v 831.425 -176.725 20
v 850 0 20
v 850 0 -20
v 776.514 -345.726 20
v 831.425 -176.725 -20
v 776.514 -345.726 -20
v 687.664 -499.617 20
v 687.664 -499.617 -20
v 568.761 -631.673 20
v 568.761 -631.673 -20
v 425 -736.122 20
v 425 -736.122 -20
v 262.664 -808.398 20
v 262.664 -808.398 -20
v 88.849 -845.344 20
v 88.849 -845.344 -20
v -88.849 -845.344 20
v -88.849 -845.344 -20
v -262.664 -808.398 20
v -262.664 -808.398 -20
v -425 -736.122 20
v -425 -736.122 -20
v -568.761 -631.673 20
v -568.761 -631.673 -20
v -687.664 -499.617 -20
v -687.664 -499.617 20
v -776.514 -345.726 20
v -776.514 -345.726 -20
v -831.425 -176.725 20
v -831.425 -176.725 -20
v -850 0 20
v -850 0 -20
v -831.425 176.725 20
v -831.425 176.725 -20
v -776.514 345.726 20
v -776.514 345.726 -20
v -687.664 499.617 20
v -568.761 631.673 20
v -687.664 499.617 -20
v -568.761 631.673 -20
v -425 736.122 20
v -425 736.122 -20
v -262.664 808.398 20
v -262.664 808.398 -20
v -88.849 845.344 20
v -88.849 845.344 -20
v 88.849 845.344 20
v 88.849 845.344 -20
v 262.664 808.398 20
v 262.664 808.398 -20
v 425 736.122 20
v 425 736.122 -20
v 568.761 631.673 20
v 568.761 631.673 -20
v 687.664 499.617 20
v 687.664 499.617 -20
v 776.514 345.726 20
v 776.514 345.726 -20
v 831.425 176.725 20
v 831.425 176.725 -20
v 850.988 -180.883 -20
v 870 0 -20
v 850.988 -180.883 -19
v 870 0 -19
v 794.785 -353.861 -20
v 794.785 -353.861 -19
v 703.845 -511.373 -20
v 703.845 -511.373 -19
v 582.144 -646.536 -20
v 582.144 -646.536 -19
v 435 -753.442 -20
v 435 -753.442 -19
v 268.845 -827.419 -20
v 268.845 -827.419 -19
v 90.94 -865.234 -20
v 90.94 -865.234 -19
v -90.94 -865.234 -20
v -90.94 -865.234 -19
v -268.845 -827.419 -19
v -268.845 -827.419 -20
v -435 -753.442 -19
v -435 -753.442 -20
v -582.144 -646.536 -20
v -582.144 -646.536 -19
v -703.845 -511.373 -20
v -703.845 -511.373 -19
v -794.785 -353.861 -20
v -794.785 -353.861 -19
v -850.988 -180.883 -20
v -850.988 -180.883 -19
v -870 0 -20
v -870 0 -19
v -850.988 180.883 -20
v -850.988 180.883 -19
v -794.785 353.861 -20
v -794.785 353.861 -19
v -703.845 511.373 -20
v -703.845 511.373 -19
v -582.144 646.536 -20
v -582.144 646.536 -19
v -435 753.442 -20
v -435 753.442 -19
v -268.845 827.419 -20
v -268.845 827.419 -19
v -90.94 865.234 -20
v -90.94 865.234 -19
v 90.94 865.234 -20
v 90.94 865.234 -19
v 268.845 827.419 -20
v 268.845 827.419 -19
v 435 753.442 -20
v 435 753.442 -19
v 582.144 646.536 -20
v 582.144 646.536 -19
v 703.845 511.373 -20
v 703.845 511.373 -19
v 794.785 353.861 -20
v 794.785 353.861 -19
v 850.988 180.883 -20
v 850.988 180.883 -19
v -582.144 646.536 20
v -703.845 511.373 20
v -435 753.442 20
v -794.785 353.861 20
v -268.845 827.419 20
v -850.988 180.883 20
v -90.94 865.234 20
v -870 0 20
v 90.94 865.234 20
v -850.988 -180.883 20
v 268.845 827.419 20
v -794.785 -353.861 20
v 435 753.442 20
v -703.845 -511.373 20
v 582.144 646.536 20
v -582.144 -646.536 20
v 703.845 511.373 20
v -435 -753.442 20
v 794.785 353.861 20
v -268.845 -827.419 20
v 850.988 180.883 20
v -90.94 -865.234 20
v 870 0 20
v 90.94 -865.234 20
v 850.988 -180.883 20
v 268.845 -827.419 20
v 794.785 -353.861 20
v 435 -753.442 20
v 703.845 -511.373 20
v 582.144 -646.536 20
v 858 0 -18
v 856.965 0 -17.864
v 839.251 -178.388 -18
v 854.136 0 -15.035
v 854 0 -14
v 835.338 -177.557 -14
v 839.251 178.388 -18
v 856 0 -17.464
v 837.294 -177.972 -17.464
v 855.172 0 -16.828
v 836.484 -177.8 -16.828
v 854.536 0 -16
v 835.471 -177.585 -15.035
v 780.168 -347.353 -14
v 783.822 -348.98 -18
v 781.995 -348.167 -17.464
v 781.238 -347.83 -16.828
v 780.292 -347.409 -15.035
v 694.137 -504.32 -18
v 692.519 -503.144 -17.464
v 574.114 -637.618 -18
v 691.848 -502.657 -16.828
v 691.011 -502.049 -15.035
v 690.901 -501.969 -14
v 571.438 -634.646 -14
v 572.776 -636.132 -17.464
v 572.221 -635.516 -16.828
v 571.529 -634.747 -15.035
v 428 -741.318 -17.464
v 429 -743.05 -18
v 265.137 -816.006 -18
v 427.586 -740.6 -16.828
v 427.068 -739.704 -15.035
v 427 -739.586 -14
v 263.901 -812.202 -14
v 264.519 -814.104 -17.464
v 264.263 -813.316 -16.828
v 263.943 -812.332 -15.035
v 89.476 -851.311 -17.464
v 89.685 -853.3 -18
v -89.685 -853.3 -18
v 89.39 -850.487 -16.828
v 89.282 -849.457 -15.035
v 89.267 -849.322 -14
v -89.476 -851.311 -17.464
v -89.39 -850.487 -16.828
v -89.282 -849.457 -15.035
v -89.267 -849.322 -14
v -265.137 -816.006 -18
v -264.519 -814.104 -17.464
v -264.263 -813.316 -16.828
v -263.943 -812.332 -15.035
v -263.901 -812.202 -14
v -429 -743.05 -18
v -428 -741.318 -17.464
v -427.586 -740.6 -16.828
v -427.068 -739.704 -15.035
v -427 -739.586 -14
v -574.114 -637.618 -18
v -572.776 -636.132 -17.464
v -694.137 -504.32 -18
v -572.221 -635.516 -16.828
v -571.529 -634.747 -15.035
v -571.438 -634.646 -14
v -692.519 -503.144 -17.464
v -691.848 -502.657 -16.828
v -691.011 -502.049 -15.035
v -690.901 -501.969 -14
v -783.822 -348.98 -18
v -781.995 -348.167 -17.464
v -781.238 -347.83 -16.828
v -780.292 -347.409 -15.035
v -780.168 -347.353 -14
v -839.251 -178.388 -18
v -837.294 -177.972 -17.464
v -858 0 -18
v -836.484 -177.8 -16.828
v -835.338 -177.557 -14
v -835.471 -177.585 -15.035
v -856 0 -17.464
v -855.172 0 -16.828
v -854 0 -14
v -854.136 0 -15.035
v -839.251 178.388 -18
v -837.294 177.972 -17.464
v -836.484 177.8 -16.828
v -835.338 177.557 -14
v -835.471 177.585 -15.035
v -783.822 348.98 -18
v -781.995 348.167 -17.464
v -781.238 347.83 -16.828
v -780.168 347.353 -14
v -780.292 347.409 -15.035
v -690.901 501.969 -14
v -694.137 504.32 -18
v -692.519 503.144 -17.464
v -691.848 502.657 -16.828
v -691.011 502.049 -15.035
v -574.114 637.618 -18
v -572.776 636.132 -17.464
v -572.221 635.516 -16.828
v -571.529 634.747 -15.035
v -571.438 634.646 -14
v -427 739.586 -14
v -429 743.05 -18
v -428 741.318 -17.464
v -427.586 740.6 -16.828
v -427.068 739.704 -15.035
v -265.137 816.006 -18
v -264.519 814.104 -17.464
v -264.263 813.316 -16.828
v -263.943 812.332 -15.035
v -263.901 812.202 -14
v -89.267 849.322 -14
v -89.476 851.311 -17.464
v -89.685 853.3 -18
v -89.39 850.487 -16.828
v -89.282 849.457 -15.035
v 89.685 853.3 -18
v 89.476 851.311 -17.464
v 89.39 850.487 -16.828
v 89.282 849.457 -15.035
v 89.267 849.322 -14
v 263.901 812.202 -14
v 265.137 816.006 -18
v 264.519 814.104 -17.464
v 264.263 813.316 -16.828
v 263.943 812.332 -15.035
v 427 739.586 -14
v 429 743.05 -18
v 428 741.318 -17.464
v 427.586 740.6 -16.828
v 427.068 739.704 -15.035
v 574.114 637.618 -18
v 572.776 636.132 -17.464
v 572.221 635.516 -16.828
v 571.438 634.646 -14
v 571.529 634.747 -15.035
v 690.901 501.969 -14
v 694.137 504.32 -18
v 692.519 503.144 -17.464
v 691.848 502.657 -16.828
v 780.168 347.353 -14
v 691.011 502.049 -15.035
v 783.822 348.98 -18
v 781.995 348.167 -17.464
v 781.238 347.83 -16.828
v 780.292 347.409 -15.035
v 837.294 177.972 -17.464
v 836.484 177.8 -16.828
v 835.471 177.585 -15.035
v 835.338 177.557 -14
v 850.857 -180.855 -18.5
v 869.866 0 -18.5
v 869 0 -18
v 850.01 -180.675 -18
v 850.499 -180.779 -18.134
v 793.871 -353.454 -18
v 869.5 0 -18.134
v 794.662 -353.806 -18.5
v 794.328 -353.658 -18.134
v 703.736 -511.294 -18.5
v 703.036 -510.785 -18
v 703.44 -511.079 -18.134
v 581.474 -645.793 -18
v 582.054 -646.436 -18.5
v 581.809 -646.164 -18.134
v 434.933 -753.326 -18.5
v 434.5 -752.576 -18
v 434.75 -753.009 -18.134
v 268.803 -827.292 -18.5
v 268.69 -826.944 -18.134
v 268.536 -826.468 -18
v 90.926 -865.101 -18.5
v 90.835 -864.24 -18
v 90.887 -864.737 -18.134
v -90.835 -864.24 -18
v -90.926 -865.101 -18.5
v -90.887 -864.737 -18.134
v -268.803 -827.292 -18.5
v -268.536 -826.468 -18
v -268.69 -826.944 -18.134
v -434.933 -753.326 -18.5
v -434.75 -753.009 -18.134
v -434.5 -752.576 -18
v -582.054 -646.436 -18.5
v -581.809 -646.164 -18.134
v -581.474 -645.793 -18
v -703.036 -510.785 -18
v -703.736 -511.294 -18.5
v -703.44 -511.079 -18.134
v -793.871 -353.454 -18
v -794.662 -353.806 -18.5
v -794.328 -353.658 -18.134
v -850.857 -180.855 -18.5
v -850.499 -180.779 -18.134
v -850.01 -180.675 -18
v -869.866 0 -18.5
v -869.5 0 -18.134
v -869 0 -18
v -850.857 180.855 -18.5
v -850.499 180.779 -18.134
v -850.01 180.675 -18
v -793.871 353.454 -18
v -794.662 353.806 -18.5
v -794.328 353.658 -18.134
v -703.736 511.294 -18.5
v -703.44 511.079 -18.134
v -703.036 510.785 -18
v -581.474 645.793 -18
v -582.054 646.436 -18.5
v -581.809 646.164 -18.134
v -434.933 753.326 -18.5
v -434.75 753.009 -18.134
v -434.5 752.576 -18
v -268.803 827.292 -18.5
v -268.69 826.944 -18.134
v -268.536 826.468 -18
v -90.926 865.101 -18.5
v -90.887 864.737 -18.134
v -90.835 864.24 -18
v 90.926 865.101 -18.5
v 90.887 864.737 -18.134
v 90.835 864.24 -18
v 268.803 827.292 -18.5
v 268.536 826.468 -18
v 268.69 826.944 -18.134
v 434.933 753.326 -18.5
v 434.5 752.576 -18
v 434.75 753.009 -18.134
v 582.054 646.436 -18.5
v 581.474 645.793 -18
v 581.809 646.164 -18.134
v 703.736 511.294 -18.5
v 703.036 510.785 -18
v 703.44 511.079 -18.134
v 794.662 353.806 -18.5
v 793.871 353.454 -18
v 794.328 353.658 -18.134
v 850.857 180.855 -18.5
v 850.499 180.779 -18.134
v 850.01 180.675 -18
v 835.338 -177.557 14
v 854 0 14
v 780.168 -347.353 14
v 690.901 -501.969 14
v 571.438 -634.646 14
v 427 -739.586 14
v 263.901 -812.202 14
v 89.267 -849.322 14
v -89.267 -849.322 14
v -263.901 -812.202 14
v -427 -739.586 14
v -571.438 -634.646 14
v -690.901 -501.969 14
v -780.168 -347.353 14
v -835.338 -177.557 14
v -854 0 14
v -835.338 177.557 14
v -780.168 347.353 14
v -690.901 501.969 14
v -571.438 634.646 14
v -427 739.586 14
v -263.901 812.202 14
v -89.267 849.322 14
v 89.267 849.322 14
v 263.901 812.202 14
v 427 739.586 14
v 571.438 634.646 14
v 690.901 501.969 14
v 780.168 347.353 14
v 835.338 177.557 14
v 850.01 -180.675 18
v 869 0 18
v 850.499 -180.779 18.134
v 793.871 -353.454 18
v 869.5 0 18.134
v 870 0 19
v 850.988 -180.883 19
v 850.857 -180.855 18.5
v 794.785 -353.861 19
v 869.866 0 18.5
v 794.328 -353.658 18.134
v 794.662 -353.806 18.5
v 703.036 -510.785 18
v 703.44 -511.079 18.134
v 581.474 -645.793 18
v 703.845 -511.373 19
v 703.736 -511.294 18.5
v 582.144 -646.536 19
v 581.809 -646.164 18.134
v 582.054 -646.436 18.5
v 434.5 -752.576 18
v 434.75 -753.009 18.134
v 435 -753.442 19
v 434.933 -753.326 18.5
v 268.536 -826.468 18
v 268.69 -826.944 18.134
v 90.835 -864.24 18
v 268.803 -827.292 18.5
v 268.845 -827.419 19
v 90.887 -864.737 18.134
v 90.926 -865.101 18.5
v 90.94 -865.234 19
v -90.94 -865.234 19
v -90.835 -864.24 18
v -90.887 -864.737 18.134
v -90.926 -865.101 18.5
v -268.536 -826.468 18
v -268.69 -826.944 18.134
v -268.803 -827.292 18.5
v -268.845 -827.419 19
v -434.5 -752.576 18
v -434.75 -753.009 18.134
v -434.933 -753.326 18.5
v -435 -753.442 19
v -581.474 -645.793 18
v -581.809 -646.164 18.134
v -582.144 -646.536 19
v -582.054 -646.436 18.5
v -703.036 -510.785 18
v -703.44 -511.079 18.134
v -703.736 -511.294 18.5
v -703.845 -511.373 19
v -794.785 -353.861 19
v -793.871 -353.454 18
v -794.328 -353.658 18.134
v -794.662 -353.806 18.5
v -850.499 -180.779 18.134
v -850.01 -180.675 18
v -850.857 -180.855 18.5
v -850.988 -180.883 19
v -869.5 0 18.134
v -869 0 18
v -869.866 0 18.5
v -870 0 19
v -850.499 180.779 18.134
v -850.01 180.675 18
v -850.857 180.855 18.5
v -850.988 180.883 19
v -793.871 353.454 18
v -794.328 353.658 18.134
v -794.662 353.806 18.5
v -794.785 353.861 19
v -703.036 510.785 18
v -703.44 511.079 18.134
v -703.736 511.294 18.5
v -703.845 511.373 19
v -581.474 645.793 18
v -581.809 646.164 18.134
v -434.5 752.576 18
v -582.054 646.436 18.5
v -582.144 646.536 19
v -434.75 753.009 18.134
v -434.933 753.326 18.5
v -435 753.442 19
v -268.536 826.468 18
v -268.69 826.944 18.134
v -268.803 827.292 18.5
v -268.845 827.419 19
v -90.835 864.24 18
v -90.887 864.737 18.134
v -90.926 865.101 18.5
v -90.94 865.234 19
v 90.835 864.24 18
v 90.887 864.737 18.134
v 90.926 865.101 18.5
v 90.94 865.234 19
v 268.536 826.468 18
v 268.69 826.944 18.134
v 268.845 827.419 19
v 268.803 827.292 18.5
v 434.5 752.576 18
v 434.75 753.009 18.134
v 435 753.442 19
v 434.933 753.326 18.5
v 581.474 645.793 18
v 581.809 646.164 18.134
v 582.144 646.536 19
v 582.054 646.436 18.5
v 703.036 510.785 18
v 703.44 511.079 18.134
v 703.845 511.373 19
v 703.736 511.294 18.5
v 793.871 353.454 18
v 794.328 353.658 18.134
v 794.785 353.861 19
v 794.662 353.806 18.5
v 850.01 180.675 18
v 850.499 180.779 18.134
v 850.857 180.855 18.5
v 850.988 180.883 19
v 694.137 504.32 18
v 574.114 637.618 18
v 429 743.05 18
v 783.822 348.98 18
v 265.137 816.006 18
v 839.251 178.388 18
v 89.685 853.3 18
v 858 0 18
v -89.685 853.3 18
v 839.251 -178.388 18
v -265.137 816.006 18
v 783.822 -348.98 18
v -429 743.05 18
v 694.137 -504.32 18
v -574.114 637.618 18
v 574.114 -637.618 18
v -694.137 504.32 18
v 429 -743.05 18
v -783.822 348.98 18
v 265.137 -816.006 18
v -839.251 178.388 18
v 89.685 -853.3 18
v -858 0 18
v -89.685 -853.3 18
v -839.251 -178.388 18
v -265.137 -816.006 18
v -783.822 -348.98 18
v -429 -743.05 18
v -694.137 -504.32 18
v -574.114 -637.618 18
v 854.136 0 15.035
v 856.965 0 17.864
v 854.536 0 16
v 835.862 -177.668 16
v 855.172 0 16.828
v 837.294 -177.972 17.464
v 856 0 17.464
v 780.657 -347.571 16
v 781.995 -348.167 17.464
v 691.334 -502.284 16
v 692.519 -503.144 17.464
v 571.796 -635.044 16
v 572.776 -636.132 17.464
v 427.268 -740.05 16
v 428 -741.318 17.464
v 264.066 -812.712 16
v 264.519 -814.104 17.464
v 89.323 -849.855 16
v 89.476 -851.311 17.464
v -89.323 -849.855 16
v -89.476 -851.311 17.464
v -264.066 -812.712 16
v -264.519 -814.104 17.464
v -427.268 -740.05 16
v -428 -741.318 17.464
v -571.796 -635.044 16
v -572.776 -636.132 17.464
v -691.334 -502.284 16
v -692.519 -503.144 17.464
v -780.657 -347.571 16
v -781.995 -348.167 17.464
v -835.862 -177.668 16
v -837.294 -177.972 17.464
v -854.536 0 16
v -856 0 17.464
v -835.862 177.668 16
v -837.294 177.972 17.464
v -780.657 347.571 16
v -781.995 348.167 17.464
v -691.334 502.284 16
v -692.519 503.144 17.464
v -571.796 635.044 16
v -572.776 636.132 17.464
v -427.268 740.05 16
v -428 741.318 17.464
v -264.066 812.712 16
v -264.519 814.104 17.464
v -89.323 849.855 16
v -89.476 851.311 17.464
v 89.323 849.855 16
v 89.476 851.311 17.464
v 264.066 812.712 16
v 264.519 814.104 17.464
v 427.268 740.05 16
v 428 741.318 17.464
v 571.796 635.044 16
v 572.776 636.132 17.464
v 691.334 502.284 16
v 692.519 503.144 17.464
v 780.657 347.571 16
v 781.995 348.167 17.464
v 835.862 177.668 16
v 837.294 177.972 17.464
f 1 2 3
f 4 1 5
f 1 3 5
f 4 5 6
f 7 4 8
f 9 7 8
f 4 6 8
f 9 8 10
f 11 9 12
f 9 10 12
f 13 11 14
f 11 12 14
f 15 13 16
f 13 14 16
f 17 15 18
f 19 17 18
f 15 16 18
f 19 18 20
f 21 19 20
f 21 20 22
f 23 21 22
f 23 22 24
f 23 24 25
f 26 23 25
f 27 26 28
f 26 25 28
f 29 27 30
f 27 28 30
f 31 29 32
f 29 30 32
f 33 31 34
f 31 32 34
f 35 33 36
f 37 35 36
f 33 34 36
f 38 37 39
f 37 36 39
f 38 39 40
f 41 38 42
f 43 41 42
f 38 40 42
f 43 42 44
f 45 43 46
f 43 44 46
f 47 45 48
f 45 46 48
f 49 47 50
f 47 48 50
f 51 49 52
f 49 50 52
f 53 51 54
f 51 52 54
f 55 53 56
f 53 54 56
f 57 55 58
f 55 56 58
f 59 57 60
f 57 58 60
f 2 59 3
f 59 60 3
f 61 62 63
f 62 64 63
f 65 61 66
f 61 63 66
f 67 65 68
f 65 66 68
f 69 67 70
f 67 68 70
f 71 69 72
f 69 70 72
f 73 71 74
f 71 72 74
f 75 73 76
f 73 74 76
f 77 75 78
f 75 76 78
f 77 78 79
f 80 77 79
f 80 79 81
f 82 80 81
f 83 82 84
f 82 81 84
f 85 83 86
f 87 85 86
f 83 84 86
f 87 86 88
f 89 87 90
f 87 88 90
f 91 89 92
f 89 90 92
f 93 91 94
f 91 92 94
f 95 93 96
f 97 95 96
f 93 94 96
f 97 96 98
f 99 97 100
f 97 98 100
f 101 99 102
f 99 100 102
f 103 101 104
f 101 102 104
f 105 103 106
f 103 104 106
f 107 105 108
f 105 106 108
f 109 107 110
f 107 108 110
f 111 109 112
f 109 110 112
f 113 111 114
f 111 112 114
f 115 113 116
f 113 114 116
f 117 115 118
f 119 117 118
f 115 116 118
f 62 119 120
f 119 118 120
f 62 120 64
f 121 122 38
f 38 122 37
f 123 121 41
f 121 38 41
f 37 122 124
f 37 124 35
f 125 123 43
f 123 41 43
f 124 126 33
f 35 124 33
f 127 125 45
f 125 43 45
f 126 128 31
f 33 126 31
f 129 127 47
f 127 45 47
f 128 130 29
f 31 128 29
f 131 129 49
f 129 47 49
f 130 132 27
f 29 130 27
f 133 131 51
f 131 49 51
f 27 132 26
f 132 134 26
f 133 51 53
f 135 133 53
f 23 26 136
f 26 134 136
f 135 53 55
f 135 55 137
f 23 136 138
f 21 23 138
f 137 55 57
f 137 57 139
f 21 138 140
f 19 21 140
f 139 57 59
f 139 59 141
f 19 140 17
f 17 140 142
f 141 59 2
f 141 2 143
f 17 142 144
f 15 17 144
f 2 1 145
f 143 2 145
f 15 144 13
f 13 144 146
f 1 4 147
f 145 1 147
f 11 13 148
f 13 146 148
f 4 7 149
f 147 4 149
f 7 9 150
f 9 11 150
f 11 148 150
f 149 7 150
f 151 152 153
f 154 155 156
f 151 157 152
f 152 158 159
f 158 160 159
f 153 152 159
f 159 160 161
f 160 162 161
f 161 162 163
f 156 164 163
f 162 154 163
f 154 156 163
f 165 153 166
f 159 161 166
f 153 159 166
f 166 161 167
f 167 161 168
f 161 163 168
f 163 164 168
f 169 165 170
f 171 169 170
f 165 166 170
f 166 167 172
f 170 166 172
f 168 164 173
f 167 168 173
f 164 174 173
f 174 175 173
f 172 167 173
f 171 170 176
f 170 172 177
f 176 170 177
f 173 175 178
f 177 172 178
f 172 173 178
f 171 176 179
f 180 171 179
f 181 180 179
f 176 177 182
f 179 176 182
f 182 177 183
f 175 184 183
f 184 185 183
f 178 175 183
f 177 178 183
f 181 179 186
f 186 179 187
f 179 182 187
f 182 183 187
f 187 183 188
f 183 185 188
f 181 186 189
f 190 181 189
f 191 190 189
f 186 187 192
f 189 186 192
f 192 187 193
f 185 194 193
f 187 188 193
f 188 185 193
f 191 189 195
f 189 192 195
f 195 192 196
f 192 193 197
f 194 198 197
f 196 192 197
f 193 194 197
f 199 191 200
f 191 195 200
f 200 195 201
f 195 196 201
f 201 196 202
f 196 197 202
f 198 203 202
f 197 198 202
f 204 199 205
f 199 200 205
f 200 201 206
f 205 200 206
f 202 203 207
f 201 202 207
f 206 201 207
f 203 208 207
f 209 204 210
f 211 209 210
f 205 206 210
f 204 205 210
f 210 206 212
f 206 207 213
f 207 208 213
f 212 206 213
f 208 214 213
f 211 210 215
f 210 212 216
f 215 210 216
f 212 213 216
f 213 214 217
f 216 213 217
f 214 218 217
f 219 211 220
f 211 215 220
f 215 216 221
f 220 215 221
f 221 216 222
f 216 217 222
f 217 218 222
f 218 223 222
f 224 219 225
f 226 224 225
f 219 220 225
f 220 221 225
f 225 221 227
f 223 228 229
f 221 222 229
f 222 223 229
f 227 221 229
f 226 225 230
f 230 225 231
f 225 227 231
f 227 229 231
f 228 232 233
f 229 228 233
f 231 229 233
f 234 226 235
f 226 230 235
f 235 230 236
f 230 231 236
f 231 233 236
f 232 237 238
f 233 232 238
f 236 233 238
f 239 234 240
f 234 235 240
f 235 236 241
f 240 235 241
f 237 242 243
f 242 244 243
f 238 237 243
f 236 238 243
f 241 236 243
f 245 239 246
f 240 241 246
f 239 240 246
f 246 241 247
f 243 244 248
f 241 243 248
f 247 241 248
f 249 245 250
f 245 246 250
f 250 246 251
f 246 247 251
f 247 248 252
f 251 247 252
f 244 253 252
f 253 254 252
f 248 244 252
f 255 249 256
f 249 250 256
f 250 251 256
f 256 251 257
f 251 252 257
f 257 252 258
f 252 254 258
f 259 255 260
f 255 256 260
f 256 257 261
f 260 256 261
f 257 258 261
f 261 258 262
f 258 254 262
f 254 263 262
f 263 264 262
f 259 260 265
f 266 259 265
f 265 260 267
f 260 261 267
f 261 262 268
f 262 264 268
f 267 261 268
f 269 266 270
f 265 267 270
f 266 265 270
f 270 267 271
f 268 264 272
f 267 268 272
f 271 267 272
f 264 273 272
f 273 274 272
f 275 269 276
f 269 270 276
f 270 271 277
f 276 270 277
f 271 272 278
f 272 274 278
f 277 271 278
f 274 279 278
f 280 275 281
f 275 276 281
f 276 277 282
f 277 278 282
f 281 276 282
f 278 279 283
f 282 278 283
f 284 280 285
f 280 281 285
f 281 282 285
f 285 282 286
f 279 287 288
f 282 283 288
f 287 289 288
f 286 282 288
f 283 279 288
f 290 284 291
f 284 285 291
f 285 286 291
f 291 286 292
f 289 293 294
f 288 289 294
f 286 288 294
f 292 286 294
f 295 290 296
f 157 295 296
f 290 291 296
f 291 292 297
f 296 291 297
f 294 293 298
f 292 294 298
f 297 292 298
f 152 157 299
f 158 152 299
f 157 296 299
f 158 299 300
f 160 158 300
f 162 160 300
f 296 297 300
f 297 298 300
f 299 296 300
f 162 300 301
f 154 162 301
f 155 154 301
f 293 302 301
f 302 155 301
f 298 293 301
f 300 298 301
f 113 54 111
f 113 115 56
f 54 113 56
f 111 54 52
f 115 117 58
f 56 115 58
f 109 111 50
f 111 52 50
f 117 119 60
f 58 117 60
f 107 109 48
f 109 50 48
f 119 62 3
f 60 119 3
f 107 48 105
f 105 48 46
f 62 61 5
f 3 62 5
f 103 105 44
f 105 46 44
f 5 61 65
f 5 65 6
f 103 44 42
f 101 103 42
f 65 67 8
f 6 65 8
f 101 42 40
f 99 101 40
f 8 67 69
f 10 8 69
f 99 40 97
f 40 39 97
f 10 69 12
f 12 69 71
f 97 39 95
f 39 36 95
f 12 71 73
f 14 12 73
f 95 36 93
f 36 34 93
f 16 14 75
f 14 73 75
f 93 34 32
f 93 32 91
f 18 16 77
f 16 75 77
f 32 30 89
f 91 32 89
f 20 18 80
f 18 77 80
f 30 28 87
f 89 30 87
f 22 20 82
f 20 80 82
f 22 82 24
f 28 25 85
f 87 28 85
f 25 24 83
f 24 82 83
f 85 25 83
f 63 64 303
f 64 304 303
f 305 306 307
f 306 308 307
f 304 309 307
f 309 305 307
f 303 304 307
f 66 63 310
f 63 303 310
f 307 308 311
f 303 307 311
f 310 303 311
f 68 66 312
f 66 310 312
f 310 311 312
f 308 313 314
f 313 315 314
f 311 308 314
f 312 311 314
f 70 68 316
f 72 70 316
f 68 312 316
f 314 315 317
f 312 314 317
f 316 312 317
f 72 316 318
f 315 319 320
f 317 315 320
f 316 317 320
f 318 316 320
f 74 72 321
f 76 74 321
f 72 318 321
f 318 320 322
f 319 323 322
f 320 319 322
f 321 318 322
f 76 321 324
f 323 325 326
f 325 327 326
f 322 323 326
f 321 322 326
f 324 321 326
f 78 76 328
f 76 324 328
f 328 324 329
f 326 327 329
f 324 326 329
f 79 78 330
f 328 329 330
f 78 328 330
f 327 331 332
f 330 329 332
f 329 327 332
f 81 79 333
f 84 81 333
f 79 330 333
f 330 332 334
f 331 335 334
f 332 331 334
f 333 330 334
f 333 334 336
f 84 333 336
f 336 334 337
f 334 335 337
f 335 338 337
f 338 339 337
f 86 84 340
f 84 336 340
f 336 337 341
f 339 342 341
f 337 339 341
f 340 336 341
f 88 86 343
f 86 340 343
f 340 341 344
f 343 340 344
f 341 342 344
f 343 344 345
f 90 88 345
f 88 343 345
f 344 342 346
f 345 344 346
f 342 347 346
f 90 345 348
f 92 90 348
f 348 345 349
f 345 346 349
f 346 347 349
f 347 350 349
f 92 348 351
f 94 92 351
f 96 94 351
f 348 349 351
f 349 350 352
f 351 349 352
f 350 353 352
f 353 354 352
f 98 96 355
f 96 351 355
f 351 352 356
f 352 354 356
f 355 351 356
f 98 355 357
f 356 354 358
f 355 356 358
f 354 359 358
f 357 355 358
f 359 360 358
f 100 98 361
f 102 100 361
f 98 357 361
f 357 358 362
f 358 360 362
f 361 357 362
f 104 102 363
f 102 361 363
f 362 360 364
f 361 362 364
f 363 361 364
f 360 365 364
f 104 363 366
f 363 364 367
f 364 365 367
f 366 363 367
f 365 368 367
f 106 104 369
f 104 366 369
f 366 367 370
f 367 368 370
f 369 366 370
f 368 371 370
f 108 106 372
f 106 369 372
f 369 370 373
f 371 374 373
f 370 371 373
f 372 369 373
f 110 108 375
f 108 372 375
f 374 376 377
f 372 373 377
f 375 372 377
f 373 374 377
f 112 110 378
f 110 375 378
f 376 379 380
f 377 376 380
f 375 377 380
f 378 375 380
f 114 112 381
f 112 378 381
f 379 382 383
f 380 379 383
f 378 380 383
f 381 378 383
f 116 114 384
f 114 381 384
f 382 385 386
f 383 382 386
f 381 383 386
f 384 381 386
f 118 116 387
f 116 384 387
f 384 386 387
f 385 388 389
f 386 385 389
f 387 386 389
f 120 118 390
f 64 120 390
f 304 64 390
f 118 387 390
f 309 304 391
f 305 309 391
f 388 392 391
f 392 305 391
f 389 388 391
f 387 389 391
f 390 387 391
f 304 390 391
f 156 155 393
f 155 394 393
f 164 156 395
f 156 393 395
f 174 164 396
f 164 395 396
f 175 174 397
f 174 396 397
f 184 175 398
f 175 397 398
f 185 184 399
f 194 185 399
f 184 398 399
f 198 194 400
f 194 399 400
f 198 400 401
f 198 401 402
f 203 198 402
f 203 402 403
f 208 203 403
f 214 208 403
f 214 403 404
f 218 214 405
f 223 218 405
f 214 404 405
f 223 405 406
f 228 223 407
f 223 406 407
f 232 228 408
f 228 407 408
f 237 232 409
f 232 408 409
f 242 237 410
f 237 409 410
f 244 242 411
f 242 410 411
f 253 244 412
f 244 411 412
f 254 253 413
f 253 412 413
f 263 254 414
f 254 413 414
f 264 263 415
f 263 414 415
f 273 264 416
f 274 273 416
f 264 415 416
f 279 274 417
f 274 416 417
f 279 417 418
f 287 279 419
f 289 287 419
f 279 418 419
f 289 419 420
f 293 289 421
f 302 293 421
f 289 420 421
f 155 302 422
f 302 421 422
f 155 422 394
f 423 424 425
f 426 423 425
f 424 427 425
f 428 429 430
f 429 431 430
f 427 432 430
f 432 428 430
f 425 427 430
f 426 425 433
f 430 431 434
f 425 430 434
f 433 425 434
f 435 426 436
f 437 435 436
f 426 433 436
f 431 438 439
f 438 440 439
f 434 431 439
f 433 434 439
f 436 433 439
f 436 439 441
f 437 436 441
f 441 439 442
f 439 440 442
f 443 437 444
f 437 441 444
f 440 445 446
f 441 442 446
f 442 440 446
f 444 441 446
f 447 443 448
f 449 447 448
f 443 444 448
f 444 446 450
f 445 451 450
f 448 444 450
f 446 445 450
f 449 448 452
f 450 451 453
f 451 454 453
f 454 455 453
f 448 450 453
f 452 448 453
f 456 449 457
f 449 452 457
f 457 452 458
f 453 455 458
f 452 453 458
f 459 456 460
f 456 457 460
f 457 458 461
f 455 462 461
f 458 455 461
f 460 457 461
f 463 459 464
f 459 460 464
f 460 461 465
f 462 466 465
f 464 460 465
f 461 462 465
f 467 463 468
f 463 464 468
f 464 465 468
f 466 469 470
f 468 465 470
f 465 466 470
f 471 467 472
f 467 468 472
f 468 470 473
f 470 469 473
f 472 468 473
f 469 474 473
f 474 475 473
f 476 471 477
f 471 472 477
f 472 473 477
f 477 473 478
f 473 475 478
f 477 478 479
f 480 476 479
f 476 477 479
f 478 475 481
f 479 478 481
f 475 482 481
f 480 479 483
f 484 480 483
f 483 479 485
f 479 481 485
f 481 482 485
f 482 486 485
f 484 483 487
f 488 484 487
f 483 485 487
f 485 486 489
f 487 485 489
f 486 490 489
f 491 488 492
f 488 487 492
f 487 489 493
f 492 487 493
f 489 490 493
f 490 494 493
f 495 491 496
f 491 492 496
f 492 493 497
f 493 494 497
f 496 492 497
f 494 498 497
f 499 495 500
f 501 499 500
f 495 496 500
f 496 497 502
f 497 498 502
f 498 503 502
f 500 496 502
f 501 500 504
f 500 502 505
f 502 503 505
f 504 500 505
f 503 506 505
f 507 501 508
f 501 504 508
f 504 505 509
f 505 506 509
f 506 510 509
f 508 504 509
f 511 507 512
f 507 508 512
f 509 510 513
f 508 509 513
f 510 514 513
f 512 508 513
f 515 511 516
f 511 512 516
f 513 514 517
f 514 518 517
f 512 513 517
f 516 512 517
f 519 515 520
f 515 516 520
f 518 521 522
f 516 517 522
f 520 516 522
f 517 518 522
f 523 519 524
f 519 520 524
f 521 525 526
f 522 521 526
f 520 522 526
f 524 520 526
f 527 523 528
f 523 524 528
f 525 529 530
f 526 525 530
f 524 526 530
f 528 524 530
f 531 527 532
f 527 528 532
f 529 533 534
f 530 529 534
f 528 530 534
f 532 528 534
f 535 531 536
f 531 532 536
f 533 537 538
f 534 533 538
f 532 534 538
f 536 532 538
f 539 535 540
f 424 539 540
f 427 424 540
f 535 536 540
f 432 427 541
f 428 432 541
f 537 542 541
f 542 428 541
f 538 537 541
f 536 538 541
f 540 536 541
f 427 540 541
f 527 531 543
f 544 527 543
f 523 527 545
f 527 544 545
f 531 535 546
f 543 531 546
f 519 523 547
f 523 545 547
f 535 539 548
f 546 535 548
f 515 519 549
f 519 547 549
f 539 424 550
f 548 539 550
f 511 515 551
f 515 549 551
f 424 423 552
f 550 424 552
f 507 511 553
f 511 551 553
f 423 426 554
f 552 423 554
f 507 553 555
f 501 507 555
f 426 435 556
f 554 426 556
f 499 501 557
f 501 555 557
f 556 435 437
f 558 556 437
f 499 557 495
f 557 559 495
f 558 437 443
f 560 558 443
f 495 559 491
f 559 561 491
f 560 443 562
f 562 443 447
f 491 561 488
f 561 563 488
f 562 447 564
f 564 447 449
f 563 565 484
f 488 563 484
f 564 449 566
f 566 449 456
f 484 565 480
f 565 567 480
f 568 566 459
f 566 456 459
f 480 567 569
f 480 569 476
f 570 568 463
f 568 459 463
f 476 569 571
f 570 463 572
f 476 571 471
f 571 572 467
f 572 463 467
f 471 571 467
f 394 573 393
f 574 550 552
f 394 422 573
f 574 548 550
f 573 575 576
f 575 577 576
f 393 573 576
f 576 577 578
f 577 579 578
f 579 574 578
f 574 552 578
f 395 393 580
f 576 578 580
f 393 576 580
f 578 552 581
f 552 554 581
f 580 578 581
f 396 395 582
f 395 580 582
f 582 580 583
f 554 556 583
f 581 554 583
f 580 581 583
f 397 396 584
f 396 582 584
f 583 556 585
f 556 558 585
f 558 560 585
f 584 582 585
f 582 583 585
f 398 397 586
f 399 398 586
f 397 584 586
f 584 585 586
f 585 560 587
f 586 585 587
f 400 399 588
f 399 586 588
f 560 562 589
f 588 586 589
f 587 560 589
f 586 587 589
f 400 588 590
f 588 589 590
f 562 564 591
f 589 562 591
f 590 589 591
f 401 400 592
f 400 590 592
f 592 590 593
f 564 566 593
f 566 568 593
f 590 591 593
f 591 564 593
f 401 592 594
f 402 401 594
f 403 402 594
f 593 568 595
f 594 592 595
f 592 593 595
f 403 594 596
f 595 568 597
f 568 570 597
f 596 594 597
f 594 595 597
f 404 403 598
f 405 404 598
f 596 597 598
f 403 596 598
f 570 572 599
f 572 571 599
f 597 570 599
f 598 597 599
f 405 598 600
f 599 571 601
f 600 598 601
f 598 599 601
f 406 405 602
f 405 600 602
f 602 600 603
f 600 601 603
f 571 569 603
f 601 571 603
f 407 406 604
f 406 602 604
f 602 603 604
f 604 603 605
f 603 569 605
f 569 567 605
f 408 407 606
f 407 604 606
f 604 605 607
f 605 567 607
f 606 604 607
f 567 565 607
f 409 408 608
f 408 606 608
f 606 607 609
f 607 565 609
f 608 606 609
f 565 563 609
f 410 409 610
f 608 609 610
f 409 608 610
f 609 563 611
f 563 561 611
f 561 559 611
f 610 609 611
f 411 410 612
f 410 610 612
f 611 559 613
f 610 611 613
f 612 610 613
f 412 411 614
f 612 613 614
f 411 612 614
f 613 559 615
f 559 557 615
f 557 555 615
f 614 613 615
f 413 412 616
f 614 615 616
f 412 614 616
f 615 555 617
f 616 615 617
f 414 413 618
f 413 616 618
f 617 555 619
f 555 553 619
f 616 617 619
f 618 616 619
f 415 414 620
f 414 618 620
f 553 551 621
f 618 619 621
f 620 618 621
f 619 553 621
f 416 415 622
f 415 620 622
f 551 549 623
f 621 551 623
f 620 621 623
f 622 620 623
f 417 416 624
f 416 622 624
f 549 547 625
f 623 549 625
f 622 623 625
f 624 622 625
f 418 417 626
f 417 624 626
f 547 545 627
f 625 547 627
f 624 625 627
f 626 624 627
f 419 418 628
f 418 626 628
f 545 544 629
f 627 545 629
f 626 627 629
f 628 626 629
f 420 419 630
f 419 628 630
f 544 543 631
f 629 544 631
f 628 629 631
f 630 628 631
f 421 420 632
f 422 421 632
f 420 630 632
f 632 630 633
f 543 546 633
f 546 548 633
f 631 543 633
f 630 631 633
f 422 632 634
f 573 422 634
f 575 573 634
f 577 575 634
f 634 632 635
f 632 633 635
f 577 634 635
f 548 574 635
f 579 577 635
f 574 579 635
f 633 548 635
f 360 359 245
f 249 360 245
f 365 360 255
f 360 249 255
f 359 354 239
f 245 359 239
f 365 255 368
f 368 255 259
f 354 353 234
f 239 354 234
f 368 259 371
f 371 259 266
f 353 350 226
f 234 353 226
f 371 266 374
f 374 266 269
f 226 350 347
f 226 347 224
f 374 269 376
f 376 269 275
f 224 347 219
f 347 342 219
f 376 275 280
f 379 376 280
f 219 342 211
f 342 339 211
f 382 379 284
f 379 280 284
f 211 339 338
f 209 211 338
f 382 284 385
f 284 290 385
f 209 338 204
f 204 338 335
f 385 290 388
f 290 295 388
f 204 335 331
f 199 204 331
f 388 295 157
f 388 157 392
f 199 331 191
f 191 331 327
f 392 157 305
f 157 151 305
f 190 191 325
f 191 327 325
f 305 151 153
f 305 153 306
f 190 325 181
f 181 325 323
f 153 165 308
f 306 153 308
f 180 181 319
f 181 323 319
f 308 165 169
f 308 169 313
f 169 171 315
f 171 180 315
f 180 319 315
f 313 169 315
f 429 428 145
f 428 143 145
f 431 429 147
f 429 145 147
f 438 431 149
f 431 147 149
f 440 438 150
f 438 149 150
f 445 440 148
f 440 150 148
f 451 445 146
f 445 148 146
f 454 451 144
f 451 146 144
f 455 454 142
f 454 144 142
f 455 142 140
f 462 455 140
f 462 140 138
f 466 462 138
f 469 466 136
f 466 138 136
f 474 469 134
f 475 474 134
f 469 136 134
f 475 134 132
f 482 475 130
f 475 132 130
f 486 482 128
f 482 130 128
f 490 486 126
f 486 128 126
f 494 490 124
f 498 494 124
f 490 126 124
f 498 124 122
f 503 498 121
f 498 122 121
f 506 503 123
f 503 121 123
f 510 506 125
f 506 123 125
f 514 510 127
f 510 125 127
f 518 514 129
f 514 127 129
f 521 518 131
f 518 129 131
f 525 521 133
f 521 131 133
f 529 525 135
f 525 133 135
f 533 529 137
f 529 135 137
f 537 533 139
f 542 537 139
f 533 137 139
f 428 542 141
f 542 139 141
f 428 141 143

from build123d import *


with BuildPart() as part:
    # Sketch1 → Revolve1 (revolve)
    with BuildSketch(Plane(origin=(0, 0, 0), x_dir=(1, 0, 0), z_dir=(0, 1, 0))):
        with BuildLine():
            Line((850, 0), (850, 20))
            Line((850, 20), (870, 20))
            Line((870, 20), (870, 19))
            ThreePointArc((870, 19), (869.707106781, 18.292893219), (869, 18))
            Line((869, 18), (858, 18))
            ThreePointArc((858, 18), (855.171572875, 16.828427125), (854, 14))
            Line((854, 14), (854, -14))
            ThreePointArc((854, -14), (855.171572875, -16.828427125), (858, -18))
            Line((858, -18), (869, -18))
            ThreePointArc((869, -18), (869.707106781, -18.292893219), (870, -19))
            Line((870, -19), (870, -20))
            Line((870, -20), (850, -20))
            Line((850, -20), (850, 0))
        make_face()
    revolve(axis=Axis((0, 0, 0), (0, 0, -1)))


solid = part.part
